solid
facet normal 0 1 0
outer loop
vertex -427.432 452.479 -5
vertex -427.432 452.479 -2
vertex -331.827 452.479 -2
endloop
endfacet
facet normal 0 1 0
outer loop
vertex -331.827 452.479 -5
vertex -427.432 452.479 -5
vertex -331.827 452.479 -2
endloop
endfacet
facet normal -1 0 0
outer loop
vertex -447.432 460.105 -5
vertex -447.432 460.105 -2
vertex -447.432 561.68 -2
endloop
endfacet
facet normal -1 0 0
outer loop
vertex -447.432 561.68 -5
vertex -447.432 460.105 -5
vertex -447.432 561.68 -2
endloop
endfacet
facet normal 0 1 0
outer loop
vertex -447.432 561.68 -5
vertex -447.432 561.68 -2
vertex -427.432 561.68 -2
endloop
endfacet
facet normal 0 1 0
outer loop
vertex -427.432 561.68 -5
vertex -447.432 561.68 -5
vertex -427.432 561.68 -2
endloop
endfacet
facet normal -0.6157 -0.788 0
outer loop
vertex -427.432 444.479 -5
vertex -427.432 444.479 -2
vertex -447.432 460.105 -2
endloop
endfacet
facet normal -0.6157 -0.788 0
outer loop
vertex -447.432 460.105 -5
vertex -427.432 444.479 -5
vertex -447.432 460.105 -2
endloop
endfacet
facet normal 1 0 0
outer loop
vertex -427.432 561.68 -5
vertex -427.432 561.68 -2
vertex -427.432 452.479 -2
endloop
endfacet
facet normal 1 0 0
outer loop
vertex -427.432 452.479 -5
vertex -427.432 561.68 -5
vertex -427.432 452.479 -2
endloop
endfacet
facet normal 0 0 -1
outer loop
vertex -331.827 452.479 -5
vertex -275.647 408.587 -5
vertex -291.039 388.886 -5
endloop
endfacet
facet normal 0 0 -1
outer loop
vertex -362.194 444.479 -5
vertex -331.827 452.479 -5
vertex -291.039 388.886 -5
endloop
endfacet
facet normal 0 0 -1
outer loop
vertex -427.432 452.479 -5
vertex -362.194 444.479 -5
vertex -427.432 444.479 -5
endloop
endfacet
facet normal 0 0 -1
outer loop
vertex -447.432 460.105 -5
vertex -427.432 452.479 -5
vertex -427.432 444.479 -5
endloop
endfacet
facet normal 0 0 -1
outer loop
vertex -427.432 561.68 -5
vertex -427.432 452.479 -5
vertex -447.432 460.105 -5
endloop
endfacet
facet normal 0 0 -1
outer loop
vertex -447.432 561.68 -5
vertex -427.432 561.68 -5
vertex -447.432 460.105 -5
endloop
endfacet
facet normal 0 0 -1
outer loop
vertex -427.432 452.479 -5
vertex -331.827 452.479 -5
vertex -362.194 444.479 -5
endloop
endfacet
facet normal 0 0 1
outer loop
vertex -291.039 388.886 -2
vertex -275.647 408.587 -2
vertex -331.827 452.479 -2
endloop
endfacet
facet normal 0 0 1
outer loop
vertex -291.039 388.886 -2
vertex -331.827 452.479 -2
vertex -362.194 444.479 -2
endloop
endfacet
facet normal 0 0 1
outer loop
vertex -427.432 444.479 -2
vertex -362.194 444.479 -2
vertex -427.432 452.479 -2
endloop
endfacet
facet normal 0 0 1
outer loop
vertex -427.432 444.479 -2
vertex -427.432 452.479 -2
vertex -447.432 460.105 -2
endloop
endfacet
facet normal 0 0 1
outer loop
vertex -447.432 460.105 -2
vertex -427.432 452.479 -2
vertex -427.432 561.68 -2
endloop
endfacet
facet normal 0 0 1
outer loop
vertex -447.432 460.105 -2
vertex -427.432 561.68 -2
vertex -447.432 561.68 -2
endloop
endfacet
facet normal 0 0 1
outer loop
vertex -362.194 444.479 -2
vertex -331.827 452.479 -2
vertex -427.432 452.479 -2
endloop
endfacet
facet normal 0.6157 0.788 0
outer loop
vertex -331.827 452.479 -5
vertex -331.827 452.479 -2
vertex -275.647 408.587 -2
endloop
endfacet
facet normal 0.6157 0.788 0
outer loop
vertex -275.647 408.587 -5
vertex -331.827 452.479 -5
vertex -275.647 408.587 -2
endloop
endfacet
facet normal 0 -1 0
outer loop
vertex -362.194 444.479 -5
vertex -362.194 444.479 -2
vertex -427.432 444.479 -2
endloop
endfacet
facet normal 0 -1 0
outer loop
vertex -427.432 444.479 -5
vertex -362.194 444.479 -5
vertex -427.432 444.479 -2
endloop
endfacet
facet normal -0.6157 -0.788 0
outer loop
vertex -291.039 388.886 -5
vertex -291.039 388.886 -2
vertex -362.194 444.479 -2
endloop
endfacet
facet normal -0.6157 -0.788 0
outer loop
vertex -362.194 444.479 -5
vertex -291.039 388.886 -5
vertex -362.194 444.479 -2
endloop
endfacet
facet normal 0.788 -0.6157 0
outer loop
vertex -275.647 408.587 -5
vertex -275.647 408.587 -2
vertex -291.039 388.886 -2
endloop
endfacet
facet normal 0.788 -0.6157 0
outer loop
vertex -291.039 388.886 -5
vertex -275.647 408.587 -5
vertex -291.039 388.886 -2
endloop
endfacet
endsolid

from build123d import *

# Parameters (mm, degrees)
BOSS_EXTRUDE1_DEPTH = 3


with BuildPart() as part:
    # Sketch3 → Boss-Extrude1 (new body)
    with BuildSketch(Plane.XY.offset(-2)):
        Polygon((-331.826668729, 452.47886283), (-275.647209147, 408.586658554), (-291.038746031, 388.886389714), (-362.193866809, 444.47886283), (-427.432442284, 444.47886283), (-447.432442284, 460.10457536), (-447.432442284, 561.679955314), (-427.432442284, 561.679955314), (-427.432442284, 452.47886283), align=None)
    extrude(amount=-BOSS_EXTRUDE1_DEPTH)


solid = part.part
